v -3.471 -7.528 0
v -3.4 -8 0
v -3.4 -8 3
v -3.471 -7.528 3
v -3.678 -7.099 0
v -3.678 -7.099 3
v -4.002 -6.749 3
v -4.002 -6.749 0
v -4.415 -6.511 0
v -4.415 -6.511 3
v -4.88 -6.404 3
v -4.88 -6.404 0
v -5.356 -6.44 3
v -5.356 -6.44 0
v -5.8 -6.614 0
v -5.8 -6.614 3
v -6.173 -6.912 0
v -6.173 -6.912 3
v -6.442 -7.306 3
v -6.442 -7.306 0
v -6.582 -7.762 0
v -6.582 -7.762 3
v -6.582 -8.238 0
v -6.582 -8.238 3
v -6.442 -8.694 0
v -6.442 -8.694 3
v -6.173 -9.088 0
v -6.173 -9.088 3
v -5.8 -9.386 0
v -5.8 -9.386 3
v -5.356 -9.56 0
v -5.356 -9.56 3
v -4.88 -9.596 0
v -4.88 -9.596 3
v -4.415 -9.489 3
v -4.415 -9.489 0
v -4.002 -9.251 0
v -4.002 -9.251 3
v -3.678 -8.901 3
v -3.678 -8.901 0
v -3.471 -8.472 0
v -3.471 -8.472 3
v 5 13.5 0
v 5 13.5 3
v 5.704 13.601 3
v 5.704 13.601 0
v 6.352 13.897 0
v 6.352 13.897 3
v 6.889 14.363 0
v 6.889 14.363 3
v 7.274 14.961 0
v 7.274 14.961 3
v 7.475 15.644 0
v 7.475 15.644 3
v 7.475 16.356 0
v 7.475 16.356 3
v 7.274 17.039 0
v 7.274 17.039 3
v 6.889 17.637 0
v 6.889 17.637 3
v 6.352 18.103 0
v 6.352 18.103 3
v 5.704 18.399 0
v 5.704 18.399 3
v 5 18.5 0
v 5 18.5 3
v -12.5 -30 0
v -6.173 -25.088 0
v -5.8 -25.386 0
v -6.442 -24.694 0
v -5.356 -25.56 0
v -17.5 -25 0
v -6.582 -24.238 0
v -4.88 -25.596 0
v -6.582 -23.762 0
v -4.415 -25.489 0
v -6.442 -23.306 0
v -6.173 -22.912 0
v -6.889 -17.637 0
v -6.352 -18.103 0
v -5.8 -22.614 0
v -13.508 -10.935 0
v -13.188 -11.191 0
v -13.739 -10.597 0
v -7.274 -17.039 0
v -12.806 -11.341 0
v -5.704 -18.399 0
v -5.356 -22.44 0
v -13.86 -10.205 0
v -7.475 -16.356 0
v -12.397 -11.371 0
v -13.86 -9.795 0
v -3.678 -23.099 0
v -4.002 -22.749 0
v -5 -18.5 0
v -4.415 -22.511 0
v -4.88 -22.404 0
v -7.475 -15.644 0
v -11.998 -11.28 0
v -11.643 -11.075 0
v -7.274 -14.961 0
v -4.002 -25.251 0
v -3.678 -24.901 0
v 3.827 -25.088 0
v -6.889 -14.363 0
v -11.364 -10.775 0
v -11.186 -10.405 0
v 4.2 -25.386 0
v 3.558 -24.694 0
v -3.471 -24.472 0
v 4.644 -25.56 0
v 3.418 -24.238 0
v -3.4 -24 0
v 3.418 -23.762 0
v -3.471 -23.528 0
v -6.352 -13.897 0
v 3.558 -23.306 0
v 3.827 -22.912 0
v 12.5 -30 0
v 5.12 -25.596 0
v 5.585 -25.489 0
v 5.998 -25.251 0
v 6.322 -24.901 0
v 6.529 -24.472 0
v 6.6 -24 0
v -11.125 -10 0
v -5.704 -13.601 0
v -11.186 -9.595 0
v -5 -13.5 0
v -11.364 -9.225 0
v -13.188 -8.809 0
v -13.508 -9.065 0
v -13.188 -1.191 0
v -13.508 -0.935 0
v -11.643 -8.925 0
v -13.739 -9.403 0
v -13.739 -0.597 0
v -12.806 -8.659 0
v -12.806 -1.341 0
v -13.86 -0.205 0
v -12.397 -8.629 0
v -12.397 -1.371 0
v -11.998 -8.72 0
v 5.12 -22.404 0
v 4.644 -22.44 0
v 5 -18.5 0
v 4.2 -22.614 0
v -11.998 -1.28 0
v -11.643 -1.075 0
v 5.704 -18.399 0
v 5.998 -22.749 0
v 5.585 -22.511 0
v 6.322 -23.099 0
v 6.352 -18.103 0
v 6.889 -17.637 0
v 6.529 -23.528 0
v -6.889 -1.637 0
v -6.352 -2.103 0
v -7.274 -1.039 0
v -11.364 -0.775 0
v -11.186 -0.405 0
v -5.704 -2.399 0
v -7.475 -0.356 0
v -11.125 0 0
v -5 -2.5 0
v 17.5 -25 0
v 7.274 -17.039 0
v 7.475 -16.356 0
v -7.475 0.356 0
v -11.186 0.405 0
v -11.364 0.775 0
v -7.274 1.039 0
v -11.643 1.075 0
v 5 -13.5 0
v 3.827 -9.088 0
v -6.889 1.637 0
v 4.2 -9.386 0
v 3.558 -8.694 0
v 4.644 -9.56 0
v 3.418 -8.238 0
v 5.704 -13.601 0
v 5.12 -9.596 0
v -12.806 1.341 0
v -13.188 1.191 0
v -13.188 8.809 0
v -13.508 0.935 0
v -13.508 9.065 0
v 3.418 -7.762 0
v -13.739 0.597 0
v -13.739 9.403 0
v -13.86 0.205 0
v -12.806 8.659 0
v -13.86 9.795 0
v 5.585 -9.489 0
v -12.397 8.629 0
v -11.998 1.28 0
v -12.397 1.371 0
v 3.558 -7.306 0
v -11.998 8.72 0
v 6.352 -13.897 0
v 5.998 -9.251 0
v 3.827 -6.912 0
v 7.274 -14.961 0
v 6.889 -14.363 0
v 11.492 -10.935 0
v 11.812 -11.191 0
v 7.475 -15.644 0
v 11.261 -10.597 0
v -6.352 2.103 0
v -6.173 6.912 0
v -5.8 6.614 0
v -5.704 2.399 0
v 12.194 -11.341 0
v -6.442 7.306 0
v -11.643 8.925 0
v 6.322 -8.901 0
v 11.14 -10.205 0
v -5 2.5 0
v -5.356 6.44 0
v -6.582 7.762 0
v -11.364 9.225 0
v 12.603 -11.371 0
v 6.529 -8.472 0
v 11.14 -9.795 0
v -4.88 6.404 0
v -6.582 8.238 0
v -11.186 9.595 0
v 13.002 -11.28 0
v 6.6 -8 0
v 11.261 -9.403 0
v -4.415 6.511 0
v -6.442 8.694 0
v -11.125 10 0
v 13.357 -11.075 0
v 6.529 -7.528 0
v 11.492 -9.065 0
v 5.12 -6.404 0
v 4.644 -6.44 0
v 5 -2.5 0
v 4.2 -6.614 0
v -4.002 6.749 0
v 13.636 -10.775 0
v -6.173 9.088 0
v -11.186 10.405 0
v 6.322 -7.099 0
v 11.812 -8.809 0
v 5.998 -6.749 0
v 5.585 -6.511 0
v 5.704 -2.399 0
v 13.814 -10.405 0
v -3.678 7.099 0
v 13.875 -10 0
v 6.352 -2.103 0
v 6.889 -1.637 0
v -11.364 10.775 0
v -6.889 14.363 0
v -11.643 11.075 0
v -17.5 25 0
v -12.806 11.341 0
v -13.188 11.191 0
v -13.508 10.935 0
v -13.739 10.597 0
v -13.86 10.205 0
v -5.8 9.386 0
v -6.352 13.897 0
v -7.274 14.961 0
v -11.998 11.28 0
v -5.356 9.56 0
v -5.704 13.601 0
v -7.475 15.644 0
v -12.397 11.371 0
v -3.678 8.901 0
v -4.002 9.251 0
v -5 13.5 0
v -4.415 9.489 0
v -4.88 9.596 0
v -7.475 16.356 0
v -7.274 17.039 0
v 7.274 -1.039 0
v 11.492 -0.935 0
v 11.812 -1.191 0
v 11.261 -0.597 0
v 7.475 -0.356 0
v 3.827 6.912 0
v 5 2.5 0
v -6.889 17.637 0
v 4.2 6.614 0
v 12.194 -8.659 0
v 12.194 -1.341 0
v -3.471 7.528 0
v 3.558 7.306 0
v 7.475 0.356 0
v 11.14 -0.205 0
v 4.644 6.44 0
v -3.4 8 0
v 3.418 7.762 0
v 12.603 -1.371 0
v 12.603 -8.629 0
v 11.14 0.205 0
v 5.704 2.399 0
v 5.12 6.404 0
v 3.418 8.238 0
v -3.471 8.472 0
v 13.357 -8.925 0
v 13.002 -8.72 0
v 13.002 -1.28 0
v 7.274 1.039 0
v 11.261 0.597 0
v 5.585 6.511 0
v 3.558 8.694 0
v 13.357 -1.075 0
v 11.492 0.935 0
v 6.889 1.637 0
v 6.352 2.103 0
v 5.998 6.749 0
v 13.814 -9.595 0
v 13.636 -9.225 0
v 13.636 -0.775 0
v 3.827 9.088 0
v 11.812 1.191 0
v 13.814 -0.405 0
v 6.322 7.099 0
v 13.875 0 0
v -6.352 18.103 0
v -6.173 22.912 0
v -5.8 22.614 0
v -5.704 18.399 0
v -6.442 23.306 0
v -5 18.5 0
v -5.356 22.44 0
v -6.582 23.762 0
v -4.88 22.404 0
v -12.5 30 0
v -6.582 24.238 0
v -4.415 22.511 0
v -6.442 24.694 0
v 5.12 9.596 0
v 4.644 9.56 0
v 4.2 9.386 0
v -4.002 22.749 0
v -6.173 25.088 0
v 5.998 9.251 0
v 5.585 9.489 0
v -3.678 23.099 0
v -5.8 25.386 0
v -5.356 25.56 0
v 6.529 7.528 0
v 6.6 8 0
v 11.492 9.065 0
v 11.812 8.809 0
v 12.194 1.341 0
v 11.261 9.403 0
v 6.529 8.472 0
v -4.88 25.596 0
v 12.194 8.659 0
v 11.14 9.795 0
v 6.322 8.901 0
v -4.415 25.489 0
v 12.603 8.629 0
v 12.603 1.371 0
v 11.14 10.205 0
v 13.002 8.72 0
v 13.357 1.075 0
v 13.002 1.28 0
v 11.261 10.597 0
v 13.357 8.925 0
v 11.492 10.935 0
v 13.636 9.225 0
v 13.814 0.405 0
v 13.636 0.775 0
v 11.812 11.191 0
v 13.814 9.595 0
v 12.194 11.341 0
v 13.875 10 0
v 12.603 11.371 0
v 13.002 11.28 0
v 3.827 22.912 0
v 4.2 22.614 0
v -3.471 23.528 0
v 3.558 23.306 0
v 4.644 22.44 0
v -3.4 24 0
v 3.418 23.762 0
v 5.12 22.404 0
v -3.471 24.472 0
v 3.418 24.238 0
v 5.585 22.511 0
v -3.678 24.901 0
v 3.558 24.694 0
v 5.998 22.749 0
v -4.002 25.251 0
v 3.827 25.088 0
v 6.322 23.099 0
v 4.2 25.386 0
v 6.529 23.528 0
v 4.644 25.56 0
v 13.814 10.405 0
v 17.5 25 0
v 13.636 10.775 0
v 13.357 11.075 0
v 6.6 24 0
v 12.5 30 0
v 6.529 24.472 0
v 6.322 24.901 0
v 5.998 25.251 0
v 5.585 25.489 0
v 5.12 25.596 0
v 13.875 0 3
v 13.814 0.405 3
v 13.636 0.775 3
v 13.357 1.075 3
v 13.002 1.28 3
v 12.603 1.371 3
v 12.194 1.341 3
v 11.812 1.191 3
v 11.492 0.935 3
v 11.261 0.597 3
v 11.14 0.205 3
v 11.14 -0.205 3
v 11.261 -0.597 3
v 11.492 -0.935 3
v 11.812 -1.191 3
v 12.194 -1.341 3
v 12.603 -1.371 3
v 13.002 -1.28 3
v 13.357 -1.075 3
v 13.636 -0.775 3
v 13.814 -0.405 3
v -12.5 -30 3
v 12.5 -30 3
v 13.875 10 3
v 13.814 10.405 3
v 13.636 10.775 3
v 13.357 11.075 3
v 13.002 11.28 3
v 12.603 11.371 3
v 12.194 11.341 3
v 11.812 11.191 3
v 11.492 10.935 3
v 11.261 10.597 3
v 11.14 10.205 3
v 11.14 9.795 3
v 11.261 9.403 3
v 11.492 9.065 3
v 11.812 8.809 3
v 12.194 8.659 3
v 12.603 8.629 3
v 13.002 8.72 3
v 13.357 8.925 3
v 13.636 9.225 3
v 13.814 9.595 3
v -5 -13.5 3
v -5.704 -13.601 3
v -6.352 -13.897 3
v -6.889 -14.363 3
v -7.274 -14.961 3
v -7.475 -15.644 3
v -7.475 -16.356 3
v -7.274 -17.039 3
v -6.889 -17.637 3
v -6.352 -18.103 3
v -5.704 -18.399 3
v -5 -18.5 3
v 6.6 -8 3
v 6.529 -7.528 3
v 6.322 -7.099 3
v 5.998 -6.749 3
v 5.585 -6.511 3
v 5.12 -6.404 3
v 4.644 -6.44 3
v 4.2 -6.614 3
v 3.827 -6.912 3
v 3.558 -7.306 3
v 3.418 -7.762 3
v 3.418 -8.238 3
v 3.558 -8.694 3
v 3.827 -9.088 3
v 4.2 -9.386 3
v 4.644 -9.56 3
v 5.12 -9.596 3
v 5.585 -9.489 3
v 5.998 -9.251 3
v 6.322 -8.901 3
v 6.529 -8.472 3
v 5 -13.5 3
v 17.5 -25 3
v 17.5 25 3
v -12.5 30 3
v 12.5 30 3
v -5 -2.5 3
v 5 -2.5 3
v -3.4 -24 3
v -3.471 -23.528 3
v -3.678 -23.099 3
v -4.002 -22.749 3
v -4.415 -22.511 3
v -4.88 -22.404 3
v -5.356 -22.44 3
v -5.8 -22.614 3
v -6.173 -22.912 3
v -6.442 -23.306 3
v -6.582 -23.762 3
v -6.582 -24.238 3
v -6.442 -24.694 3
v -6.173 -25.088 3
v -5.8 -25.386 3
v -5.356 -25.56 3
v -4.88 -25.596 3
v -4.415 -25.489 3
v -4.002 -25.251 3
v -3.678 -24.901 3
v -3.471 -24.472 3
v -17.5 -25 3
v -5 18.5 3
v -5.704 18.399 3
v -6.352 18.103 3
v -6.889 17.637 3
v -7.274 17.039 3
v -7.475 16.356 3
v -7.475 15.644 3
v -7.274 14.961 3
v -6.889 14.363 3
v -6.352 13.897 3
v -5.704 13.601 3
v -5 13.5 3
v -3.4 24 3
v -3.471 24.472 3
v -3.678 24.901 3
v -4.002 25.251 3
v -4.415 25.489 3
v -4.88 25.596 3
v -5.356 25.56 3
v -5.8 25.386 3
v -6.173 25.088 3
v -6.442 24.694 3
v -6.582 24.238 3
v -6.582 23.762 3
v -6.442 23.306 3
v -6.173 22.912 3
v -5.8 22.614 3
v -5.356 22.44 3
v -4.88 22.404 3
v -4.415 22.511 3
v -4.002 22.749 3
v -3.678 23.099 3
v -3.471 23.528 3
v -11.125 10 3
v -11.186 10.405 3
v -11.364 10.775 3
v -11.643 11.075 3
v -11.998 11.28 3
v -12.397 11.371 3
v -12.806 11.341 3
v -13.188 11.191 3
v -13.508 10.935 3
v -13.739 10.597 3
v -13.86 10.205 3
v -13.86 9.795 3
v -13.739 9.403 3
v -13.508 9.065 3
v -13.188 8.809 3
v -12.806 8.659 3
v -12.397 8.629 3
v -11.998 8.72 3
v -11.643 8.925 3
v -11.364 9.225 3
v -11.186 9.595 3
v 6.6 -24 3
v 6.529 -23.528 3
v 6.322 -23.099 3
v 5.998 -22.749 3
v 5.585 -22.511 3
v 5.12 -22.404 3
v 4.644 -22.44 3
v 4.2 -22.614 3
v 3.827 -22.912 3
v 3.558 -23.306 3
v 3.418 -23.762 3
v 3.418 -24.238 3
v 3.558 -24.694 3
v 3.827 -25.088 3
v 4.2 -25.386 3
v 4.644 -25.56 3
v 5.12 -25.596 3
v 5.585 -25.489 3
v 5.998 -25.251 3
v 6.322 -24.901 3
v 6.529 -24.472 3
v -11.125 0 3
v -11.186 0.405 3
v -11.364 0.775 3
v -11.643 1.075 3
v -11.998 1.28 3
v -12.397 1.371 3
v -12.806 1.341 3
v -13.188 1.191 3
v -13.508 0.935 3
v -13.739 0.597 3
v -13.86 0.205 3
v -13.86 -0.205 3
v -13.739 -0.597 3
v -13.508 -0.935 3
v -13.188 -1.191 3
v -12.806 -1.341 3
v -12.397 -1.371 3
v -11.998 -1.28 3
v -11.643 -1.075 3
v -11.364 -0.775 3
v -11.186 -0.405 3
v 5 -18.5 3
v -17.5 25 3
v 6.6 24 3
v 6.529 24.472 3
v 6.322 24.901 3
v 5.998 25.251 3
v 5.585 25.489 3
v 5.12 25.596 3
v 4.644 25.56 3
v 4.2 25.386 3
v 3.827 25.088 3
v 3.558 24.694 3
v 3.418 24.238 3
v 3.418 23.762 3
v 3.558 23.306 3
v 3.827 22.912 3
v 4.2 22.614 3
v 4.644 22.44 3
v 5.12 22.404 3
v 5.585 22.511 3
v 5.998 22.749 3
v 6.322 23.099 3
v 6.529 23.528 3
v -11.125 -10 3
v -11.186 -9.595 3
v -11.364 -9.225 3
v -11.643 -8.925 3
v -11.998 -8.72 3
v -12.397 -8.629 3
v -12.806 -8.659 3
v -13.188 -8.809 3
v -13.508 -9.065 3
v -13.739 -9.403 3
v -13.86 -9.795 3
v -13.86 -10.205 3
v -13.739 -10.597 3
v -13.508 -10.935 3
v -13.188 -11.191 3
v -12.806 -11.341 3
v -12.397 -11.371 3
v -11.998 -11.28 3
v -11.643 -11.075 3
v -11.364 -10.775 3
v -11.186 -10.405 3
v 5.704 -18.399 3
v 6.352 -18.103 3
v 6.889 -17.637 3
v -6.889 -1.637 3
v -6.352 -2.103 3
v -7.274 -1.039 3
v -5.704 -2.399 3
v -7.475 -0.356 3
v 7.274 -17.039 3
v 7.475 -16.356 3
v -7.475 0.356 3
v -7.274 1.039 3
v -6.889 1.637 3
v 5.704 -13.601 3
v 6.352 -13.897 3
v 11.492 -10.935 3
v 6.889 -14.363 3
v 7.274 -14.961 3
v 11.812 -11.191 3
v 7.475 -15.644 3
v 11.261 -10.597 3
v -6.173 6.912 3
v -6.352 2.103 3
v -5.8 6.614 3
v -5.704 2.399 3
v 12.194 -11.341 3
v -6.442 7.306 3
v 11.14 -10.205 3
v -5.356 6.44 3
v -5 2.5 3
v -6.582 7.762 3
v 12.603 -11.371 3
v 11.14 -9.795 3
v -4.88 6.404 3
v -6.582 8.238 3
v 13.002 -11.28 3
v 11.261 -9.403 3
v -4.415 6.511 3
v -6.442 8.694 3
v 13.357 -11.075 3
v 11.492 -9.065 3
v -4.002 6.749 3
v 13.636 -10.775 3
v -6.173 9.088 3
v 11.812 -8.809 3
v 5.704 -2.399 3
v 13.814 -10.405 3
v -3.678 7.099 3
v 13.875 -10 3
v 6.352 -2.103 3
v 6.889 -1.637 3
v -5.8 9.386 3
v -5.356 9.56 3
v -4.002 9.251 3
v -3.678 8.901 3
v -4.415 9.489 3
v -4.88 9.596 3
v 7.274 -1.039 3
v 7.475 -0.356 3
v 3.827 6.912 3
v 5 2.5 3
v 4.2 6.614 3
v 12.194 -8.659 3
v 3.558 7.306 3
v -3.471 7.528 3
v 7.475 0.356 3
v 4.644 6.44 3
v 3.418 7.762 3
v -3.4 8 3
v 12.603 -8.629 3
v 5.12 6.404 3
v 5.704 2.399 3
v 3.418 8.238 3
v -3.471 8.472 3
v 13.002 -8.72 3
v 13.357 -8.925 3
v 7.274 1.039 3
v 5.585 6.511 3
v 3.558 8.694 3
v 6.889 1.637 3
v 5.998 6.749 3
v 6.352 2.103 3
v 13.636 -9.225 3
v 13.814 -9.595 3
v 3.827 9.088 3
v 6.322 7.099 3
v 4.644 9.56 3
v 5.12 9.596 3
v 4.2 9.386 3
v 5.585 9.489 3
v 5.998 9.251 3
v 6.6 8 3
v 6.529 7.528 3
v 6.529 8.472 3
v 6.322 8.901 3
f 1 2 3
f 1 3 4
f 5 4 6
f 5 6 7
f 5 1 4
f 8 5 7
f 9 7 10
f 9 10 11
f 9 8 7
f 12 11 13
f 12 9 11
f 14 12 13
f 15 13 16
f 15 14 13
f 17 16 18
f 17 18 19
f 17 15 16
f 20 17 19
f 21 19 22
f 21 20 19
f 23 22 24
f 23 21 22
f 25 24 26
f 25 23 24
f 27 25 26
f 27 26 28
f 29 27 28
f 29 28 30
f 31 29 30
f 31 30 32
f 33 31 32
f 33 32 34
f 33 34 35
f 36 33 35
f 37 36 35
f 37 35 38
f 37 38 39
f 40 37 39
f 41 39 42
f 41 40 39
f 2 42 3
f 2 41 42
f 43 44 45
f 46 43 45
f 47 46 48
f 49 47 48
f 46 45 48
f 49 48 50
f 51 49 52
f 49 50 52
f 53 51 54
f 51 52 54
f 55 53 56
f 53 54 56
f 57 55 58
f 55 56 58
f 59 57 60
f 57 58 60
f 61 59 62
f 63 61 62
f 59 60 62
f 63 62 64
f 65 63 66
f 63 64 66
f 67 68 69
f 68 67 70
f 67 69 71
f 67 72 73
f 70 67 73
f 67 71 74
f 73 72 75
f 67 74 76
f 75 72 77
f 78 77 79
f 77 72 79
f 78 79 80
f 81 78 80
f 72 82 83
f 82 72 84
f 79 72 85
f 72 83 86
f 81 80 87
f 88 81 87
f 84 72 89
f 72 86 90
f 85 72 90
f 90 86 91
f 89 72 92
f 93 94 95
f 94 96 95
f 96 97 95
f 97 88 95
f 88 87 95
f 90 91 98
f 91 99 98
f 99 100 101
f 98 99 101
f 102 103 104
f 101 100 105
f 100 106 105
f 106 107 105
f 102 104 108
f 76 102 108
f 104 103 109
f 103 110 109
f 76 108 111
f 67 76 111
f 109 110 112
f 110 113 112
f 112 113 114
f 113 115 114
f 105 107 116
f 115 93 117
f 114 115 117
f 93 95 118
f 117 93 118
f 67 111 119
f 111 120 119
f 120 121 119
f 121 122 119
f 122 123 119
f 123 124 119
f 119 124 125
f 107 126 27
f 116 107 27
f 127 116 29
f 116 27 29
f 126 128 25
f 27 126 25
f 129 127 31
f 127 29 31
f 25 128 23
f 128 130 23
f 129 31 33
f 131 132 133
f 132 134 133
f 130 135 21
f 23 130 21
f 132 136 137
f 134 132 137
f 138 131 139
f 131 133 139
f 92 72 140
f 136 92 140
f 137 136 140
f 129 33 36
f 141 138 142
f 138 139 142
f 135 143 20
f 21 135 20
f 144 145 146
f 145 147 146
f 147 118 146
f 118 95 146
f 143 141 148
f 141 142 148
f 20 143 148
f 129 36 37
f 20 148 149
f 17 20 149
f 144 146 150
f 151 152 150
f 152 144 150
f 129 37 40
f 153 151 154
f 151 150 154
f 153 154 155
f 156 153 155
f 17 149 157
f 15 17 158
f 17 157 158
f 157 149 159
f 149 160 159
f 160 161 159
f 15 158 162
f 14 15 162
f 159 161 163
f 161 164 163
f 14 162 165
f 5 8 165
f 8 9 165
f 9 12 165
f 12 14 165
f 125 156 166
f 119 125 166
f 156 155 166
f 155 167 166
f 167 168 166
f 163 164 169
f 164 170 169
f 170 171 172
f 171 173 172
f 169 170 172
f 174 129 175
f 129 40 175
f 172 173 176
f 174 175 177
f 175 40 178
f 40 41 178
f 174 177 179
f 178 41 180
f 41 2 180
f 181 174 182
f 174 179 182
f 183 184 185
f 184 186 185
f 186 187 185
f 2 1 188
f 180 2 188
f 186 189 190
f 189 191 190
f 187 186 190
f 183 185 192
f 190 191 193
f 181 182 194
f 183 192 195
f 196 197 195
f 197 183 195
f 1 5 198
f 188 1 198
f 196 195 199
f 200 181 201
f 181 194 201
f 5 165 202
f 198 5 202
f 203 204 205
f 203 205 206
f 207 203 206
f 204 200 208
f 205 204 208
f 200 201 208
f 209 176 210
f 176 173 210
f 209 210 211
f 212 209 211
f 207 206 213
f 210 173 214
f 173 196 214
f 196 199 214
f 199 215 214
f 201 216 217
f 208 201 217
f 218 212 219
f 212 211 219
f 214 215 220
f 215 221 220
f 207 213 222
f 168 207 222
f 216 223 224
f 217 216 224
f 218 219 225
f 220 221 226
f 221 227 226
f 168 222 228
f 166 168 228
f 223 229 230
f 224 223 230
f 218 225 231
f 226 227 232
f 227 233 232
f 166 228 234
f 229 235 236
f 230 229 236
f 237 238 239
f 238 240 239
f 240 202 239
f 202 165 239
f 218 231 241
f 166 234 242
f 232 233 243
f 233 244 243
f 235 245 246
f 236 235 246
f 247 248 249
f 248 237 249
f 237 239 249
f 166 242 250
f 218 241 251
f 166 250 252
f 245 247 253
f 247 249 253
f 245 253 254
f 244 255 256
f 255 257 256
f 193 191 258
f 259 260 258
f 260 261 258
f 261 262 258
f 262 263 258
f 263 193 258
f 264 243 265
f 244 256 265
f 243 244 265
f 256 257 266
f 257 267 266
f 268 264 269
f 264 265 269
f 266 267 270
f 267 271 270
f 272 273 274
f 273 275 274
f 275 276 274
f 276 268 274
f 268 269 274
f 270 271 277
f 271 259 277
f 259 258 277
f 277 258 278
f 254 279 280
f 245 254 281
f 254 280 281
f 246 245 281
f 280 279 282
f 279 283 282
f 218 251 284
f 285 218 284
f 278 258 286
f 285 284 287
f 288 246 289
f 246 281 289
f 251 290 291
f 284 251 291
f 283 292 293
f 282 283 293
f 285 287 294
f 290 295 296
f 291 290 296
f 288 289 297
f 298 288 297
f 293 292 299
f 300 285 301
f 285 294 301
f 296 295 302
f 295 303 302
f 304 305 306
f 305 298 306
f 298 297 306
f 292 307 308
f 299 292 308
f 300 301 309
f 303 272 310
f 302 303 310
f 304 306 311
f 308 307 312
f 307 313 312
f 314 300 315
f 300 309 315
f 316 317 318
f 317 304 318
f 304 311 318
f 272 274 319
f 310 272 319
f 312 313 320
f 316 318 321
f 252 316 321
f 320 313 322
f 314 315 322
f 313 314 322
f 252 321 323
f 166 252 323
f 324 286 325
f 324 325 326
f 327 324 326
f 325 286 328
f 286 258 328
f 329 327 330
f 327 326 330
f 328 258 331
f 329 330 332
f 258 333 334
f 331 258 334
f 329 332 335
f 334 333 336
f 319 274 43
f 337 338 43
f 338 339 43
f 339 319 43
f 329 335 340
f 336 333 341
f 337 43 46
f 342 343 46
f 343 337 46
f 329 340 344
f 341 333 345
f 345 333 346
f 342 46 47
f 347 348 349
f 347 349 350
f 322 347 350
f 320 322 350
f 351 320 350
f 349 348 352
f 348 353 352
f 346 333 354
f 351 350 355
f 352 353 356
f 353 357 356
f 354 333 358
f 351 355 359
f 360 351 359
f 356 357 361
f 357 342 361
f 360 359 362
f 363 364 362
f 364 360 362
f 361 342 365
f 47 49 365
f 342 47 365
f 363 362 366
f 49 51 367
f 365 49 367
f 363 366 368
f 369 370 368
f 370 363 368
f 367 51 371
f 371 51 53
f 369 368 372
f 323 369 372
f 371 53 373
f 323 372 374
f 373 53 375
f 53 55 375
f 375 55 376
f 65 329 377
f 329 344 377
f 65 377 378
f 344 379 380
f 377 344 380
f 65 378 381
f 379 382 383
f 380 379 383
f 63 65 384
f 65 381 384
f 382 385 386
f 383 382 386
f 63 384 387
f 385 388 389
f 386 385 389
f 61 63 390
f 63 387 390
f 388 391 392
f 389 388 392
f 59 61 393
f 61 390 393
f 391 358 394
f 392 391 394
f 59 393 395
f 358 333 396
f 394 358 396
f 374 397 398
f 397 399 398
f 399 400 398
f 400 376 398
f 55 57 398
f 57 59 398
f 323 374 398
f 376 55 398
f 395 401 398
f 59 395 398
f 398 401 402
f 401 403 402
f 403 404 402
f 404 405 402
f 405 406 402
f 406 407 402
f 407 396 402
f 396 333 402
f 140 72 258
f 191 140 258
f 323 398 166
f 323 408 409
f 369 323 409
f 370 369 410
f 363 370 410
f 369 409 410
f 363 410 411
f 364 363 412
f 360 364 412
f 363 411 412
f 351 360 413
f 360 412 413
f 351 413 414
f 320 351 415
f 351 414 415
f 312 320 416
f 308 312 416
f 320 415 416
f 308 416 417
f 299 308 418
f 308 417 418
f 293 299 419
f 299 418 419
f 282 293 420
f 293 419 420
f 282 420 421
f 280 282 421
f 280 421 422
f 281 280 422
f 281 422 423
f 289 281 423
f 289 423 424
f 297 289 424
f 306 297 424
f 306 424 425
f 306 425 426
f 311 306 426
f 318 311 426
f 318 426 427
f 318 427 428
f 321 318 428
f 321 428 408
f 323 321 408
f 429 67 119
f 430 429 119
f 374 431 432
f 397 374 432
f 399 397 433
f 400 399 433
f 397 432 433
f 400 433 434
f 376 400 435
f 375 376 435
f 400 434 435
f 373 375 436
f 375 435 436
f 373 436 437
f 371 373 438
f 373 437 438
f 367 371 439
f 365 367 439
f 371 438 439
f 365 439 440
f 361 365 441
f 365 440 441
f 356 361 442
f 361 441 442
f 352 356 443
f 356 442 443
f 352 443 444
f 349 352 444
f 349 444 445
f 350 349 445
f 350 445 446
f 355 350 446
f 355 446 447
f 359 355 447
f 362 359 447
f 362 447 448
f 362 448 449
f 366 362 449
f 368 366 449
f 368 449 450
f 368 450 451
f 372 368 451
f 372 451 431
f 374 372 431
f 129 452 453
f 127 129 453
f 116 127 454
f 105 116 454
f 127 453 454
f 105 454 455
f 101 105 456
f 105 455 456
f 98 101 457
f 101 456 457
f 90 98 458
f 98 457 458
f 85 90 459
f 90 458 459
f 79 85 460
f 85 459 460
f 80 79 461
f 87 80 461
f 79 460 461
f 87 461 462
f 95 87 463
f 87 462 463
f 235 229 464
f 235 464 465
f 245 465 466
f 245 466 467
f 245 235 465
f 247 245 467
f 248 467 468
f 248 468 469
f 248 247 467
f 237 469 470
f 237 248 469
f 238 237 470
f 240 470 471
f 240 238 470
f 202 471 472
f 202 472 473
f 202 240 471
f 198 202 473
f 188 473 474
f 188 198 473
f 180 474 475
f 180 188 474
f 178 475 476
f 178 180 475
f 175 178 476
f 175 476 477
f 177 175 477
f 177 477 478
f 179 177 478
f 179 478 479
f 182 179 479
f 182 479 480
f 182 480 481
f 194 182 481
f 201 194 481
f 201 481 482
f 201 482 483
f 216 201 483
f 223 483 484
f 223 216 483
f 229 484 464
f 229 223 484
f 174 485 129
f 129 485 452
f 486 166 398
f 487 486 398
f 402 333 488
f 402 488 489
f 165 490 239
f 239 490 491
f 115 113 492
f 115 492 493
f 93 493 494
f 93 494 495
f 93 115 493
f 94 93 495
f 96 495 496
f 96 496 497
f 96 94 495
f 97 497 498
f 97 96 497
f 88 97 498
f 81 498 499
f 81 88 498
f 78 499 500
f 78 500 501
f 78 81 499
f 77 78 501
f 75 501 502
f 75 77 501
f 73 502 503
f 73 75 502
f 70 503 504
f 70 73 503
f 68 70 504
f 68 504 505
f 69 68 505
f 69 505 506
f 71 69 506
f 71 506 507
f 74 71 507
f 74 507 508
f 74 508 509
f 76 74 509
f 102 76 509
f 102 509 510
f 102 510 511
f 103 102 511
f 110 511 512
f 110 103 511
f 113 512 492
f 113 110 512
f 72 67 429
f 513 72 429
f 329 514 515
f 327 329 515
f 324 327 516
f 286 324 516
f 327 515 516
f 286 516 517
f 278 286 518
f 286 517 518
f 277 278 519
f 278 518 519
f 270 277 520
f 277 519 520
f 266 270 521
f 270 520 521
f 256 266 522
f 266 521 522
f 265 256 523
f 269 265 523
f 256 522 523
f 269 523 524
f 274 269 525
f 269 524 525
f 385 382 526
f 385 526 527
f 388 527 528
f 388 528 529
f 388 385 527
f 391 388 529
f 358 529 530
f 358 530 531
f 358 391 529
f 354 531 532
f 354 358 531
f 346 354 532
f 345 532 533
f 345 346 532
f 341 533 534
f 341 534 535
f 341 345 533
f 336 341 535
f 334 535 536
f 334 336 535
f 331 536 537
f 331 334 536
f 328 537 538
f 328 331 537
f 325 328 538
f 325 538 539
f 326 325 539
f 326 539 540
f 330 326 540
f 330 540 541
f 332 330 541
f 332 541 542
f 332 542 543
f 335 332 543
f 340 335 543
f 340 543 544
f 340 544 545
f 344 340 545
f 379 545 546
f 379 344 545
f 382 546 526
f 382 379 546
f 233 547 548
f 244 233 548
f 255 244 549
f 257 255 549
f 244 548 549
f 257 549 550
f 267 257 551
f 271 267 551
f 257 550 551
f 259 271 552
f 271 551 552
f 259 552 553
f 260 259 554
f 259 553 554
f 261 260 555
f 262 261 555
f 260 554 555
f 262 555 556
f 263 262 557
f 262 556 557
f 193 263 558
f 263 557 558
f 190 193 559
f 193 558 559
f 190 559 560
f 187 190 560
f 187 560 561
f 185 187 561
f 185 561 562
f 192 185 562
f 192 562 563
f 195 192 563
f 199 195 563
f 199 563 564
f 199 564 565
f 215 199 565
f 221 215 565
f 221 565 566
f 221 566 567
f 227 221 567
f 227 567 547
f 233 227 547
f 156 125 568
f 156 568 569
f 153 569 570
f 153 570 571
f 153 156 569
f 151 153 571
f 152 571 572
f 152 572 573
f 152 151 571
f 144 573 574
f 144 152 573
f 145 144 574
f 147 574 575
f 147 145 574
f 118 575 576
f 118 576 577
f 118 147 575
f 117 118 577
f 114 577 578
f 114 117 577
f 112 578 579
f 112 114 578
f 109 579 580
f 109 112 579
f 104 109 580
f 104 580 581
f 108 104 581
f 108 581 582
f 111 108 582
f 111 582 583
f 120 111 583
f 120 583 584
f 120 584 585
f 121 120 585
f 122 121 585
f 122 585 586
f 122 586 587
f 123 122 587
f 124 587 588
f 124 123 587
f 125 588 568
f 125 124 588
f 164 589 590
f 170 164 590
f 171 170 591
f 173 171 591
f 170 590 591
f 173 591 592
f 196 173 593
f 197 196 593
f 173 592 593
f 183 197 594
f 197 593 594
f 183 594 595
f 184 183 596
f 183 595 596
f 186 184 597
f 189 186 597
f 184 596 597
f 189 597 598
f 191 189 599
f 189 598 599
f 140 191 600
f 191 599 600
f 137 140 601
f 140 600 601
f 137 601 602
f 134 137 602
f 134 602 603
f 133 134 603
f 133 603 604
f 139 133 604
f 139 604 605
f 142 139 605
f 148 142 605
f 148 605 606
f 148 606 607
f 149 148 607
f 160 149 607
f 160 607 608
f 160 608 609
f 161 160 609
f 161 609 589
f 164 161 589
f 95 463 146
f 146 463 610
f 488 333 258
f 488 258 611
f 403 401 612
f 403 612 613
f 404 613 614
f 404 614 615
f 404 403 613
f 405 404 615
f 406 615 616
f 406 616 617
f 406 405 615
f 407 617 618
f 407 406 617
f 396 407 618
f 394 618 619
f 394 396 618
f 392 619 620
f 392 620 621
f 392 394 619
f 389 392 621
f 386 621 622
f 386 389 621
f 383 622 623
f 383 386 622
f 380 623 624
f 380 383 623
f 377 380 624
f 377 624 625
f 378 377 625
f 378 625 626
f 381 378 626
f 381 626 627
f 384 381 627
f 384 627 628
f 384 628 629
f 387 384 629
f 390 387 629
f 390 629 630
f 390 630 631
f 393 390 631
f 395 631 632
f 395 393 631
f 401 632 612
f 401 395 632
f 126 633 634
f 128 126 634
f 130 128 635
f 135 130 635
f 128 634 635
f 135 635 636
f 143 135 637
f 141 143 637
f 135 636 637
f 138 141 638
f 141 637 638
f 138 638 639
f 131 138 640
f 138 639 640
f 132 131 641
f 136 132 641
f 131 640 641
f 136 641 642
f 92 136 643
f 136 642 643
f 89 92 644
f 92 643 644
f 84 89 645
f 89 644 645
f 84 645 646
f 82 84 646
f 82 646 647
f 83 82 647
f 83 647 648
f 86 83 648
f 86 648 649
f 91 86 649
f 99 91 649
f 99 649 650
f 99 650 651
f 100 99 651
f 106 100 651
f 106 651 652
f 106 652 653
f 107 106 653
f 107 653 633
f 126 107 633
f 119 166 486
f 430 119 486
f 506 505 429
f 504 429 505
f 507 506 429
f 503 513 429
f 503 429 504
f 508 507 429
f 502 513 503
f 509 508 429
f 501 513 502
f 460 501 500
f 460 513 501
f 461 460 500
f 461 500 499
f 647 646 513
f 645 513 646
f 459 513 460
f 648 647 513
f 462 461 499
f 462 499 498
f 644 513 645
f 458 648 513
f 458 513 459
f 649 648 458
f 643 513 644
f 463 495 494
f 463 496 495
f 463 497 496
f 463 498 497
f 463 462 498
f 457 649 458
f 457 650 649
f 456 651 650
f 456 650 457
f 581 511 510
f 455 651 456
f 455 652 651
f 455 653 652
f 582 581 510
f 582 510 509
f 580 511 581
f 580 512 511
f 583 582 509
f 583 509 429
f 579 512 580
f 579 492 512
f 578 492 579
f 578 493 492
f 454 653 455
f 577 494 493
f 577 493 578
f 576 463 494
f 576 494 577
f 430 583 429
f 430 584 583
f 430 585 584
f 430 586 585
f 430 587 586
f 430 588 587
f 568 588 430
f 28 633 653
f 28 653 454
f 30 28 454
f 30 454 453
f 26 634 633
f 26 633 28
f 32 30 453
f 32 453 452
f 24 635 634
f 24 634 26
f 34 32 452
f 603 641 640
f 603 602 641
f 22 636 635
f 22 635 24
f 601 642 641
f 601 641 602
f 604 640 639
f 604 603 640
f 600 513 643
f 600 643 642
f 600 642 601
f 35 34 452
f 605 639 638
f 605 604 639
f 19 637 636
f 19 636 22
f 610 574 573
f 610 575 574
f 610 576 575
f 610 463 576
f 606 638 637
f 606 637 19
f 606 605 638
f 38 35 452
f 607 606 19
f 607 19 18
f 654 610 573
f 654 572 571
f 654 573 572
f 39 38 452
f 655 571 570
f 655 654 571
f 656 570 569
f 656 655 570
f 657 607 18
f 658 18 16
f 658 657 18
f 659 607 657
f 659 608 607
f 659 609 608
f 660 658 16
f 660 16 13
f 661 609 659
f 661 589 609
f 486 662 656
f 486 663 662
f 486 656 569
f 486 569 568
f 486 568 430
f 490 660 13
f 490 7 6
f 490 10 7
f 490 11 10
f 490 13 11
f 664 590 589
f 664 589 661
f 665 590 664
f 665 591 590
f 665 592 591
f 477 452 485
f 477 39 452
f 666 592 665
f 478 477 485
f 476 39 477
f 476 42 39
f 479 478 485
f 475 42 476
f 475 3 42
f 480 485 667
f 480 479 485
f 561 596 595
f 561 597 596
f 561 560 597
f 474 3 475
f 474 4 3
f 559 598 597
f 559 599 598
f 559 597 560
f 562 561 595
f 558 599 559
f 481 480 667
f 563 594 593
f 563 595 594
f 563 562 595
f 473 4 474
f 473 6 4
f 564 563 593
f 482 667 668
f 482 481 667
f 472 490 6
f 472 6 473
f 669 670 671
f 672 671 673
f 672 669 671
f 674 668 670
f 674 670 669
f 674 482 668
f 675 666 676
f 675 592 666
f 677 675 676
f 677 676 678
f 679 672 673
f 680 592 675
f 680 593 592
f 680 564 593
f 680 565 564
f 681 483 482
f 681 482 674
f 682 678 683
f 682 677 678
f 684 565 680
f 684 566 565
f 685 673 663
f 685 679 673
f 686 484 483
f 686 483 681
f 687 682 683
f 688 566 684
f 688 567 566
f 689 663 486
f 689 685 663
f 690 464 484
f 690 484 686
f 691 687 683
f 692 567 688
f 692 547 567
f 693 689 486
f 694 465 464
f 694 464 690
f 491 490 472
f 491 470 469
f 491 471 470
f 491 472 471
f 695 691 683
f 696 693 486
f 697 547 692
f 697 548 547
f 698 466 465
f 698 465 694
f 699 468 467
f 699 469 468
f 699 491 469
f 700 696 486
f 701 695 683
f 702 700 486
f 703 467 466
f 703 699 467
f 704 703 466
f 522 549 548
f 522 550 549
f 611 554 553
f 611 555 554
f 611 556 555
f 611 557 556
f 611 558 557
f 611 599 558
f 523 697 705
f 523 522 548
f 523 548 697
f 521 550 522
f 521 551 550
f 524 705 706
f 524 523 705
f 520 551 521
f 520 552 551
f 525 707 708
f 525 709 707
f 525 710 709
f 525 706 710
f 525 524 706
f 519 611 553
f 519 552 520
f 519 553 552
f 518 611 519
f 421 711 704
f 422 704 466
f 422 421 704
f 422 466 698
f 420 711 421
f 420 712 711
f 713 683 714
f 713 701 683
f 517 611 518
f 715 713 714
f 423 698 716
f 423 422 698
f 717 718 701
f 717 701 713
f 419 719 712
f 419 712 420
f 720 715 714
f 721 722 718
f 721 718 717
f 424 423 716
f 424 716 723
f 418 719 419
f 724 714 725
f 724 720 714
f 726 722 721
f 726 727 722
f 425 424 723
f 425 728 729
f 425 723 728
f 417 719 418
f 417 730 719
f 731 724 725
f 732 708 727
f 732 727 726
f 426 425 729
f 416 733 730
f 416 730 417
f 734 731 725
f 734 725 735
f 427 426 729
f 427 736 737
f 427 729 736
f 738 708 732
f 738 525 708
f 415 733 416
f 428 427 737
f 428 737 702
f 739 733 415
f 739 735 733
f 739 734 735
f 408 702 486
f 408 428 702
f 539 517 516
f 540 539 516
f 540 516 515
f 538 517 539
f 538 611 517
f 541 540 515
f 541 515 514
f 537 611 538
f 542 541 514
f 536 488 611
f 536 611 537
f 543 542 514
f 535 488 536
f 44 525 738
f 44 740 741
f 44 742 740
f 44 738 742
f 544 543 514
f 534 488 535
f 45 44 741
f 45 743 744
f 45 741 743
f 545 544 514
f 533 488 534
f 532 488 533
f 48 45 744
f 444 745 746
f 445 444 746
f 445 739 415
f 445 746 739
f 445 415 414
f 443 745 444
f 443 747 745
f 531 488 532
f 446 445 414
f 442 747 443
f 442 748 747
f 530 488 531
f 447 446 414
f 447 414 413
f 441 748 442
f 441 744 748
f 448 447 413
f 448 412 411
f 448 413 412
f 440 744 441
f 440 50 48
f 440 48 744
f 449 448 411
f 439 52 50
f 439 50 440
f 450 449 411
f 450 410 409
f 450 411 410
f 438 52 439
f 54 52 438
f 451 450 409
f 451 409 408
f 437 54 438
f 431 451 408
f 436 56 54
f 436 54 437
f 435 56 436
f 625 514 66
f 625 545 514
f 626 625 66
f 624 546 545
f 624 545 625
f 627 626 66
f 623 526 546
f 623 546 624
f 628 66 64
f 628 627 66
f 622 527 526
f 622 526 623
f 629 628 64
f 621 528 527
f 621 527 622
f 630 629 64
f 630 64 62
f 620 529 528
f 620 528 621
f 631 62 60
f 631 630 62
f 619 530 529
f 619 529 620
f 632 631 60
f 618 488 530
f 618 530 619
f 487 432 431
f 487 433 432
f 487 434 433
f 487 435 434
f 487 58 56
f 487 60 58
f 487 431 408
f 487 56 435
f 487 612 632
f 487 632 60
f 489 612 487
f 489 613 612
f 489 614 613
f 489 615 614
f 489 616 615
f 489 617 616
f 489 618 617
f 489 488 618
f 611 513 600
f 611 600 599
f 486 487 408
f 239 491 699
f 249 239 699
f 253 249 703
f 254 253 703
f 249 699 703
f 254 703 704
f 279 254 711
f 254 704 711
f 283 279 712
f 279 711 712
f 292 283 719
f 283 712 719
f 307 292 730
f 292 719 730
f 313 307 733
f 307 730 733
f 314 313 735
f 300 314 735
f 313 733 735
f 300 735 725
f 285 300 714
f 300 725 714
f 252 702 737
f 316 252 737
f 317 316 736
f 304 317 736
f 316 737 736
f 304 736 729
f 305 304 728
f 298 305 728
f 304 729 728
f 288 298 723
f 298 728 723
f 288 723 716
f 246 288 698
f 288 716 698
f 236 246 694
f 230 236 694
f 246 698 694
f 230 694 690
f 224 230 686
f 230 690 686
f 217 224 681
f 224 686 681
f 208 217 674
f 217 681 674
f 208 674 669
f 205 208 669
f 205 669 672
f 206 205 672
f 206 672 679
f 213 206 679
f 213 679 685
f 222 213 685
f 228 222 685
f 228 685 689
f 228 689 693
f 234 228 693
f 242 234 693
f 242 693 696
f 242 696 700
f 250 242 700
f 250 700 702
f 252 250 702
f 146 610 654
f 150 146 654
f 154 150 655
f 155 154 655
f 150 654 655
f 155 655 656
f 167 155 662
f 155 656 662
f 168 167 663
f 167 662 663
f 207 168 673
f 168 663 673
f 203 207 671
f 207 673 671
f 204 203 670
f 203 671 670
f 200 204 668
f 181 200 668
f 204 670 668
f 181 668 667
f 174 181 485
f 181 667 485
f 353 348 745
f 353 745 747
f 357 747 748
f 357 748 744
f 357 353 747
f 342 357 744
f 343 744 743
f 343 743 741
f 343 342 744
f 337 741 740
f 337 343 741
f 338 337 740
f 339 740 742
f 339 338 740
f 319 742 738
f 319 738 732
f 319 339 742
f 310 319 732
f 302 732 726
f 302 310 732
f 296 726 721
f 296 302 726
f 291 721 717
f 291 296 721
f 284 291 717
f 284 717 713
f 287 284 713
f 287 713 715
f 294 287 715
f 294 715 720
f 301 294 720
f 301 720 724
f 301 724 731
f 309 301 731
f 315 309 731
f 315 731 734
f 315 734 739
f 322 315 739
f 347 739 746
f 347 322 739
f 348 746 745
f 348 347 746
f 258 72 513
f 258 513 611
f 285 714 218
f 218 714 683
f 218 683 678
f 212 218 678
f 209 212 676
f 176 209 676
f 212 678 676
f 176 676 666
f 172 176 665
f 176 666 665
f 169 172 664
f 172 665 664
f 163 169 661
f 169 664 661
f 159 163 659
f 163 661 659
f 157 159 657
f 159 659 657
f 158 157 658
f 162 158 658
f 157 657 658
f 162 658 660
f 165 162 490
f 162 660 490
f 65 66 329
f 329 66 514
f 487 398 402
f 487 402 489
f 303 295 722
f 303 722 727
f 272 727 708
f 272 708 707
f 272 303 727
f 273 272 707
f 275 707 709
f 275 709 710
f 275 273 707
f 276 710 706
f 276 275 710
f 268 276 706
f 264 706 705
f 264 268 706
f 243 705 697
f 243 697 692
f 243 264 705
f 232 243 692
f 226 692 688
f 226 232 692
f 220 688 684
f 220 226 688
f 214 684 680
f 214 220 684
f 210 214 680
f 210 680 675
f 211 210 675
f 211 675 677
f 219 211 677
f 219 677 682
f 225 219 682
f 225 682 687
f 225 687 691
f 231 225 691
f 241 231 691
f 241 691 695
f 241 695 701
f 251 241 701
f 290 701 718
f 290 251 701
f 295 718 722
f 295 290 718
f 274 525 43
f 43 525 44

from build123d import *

# Parameters (mm, degrees)
SKETCH_1_W          = 35
SKETCH_1_H          = 60
SKETCH_1_R          = 1.6
EXTRUDE_1_DEPTH     = 3
CUT_EXTRUDE_1_REACH = 5
SKETCH_2_R          = 1.375
CHAMFER_1_SIZE      = 5
CUT_EXTRUDE_2_REACH = 5


with BuildPart() as part:
    # 草图1 → 凸台-拉伸1 (new body)
    with BuildSketch(Plane.XY):
        Rectangle(SKETCH_1_W, SKETCH_1_H)
        with Locations((-5, 8)):
            Circle(SKETCH_1_R, mode=Mode.SUBTRACT)
        with Locations((5, 8)):
            Circle(SKETCH_1_R, mode=Mode.SUBTRACT)
        with Locations((-5, 24)):
            Circle(SKETCH_1_R, mode=Mode.SUBTRACT)
        with Locations((5, 24)):
            Circle(SKETCH_1_R, mode=Mode.SUBTRACT)
        with Locations((-5, -8)):
            Circle(SKETCH_1_R, mode=Mode.SUBTRACT)
        with Locations((5, -8)):
            Circle(SKETCH_1_R, mode=Mode.SUBTRACT)
        with Locations((-5, -24)):
            Circle(SKETCH_1_R, mode=Mode.SUBTRACT)
        with Locations((5, -24)):
            Circle(SKETCH_1_R, mode=Mode.SUBTRACT)
    extrude(amount=EXTRUDE_1_DEPTH)

    # 草图2 → 切除-拉伸1 (cut, up to next)
    with BuildSketch(Plane.XY.offset(3), mode=Mode.PRIVATE) as cut_extrude_1_sk1:
        with Locations((12.5, 0)):
            Circle(SKETCH_2_R)
    cut_extrude_1_tool1 = extrude(cut_extrude_1_sk1.sketch, amount=-CUT_EXTRUDE_1_REACH, mode=Mode.PRIVATE) & part.part
    add(cut_extrude_1_tool1.solids().sort_by_distance((12.5, 0, 3))[0], mode=Mode.SUBTRACT)
    # 草图2 → 切除-拉伸1 (cut, up to next)
    with BuildSketch(Plane.XY.offset(3), mode=Mode.PRIVATE) as cut_extrude_1_sk2:
        with Locations((-12.5, 0)):
            Circle(SKETCH_2_R)
    cut_extrude_1_tool2 = extrude(cut_extrude_1_sk2.sketch, amount=-CUT_EXTRUDE_1_REACH, mode=Mode.PRIVATE) & part.part
    add(cut_extrude_1_tool2.solids().sort_by_distance((-12.5, 0, 3))[0], mode=Mode.SUBTRACT)
    # 草图2 → 切除-拉伸1 (cut, up to next)
    with BuildSketch(Plane.XY.offset(3), mode=Mode.PRIVATE) as cut_extrude_1_sk3:
        with Locations((-12.5, 10)):
            Circle(SKETCH_2_R)
    cut_extrude_1_tool3 = extrude(cut_extrude_1_sk3.sketch, amount=-CUT_EXTRUDE_1_REACH, mode=Mode.PRIVATE) & part.part
    add(cut_extrude_1_tool3.solids().sort_by_distance((-12.5, 10, 3))[0], mode=Mode.SUBTRACT)
    # 草图2 → 切除-拉伸1 (cut, up to next)
    with BuildSketch(Plane.XY.offset(3), mode=Mode.PRIVATE) as cut_extrude_1_sk4:
        with Locations((12.5, 10)):
            Circle(SKETCH_2_R)
    cut_extrude_1_tool4 = extrude(cut_extrude_1_sk4.sketch, amount=-CUT_EXTRUDE_1_REACH, mode=Mode.PRIVATE) & part.part
    add(cut_extrude_1_tool4.solids().sort_by_distance((12.5, 10, 3))[0], mode=Mode.SUBTRACT)
    # 草图2 → 切除-拉伸1 (cut, up to next)
    with BuildSketch(Plane.XY.offset(3), mode=Mode.PRIVATE) as cut_extrude_1_sk5:
        with Locations((-12.5, -10)):
            Circle(SKETCH_2_R)
    cut_extrude_1_tool5 = extrude(cut_extrude_1_sk5.sketch, amount=-CUT_EXTRUDE_1_REACH, mode=Mode.PRIVATE) & part.part
    add(cut_extrude_1_tool5.solids().sort_by_distance((-12.5, -10, 3))[0], mode=Mode.SUBTRACT)
    # 草图2 → 切除-拉伸1 (cut, up to next)
    with BuildSketch(Plane.XY.offset(3), mode=Mode.PRIVATE) as cut_extrude_1_sk6:
        with Locations((12.5, -10)):
            Circle(SKETCH_2_R)
    cut_extrude_1_tool6 = extrude(cut_extrude_1_sk6.sketch, amount=-CUT_EXTRUDE_1_REACH, mode=Mode.PRIVATE) & part.part
    add(cut_extrude_1_tool6.solids().sort_by_distance((12.5, -10, 3))[0], mode=Mode.SUBTRACT)

    # 倒角1
    chamfer_1_edges = [part.edges().sort_by_distance(p)[0] for p in [
        (17.5, -30, 1.5),
        (-17.5, -30, 1.5),
        (-17.5, 30, 1.5),
        (17.5, 30, 1.5),
    ]]
    chamfer(chamfer_1_edges, length=CHAMFER_1_SIZE)

    # 草图3 → 切除-拉伸2 (cut, up to next)
    with BuildSketch(Plane.XY.offset(3), mode=Mode.PRIVATE) as cut_extrude_2_sk1:
        with BuildLine():
            Line((-5, -2.5), (5, -2.5))
            ThreePointArc((5, -2.5), (7.5, 0), (5, 2.5))
            Line((5, 2.5), (-5, 2.5))
            ThreePointArc((-5, 2.5), (-7.5, 0), (-5, -2.5))
        make_face()
    cut_extrude_2_tool1 = extrude(cut_extrude_2_sk1.sketch, amount=-CUT_EXTRUDE_2_REACH, mode=Mode.PRIVATE) & part.part
    add(cut_extrude_2_tool1.solids().sort_by_distance((0, 0, 3))[0], mode=Mode.SUBTRACT)
    # 草图3 → 切除-拉伸2 (cut, up to next)
    with BuildSketch(Plane.XY.offset(3), mode=Mode.PRIVATE) as cut_extrude_2_sk2:
        with BuildLine():
            Line((-5, 13.5), (5, 13.5))
            ThreePointArc((5, 13.5), (7.5, 16), (5, 18.5))
            Line((5, 18.5), (-5, 18.5))
            ThreePointArc((-5, 18.5), (-7.5, 16), (-5, 13.5))
        make_face()
    cut_extrude_2_tool2 = extrude(cut_extrude_2_sk2.sketch, amount=-CUT_EXTRUDE_2_REACH, mode=Mode.PRIVATE) & part.part
    add(cut_extrude_2_tool2.solids().sort_by_distance((0, 16, 3))[0], mode=Mode.SUBTRACT)
    # 草图3 → 切除-拉伸2 (cut, up to next)
    with BuildSketch(Plane.XY.offset(3), mode=Mode.PRIVATE) as cut_extrude_2_sk3:
        with BuildLine():
            Line((-5, -18.5), (5, -18.5))
            ThreePointArc((5, -18.5), (7.5, -16), (5, -13.5))
            Line((5, -13.5), (-5, -13.5))
            ThreePointArc((-5, -13.5), (-7.5, -16), (-5, -18.5))
        make_face()
    cut_extrude_2_tool3 = extrude(cut_extrude_2_sk3.sketch, amount=-CUT_EXTRUDE_2_REACH, mode=Mode.PRIVATE) & part.part
    add(cut_extrude_2_tool3.solids().sort_by_distance((0, -16, 3))[0], mode=Mode.SUBTRACT)


solid = part.part
